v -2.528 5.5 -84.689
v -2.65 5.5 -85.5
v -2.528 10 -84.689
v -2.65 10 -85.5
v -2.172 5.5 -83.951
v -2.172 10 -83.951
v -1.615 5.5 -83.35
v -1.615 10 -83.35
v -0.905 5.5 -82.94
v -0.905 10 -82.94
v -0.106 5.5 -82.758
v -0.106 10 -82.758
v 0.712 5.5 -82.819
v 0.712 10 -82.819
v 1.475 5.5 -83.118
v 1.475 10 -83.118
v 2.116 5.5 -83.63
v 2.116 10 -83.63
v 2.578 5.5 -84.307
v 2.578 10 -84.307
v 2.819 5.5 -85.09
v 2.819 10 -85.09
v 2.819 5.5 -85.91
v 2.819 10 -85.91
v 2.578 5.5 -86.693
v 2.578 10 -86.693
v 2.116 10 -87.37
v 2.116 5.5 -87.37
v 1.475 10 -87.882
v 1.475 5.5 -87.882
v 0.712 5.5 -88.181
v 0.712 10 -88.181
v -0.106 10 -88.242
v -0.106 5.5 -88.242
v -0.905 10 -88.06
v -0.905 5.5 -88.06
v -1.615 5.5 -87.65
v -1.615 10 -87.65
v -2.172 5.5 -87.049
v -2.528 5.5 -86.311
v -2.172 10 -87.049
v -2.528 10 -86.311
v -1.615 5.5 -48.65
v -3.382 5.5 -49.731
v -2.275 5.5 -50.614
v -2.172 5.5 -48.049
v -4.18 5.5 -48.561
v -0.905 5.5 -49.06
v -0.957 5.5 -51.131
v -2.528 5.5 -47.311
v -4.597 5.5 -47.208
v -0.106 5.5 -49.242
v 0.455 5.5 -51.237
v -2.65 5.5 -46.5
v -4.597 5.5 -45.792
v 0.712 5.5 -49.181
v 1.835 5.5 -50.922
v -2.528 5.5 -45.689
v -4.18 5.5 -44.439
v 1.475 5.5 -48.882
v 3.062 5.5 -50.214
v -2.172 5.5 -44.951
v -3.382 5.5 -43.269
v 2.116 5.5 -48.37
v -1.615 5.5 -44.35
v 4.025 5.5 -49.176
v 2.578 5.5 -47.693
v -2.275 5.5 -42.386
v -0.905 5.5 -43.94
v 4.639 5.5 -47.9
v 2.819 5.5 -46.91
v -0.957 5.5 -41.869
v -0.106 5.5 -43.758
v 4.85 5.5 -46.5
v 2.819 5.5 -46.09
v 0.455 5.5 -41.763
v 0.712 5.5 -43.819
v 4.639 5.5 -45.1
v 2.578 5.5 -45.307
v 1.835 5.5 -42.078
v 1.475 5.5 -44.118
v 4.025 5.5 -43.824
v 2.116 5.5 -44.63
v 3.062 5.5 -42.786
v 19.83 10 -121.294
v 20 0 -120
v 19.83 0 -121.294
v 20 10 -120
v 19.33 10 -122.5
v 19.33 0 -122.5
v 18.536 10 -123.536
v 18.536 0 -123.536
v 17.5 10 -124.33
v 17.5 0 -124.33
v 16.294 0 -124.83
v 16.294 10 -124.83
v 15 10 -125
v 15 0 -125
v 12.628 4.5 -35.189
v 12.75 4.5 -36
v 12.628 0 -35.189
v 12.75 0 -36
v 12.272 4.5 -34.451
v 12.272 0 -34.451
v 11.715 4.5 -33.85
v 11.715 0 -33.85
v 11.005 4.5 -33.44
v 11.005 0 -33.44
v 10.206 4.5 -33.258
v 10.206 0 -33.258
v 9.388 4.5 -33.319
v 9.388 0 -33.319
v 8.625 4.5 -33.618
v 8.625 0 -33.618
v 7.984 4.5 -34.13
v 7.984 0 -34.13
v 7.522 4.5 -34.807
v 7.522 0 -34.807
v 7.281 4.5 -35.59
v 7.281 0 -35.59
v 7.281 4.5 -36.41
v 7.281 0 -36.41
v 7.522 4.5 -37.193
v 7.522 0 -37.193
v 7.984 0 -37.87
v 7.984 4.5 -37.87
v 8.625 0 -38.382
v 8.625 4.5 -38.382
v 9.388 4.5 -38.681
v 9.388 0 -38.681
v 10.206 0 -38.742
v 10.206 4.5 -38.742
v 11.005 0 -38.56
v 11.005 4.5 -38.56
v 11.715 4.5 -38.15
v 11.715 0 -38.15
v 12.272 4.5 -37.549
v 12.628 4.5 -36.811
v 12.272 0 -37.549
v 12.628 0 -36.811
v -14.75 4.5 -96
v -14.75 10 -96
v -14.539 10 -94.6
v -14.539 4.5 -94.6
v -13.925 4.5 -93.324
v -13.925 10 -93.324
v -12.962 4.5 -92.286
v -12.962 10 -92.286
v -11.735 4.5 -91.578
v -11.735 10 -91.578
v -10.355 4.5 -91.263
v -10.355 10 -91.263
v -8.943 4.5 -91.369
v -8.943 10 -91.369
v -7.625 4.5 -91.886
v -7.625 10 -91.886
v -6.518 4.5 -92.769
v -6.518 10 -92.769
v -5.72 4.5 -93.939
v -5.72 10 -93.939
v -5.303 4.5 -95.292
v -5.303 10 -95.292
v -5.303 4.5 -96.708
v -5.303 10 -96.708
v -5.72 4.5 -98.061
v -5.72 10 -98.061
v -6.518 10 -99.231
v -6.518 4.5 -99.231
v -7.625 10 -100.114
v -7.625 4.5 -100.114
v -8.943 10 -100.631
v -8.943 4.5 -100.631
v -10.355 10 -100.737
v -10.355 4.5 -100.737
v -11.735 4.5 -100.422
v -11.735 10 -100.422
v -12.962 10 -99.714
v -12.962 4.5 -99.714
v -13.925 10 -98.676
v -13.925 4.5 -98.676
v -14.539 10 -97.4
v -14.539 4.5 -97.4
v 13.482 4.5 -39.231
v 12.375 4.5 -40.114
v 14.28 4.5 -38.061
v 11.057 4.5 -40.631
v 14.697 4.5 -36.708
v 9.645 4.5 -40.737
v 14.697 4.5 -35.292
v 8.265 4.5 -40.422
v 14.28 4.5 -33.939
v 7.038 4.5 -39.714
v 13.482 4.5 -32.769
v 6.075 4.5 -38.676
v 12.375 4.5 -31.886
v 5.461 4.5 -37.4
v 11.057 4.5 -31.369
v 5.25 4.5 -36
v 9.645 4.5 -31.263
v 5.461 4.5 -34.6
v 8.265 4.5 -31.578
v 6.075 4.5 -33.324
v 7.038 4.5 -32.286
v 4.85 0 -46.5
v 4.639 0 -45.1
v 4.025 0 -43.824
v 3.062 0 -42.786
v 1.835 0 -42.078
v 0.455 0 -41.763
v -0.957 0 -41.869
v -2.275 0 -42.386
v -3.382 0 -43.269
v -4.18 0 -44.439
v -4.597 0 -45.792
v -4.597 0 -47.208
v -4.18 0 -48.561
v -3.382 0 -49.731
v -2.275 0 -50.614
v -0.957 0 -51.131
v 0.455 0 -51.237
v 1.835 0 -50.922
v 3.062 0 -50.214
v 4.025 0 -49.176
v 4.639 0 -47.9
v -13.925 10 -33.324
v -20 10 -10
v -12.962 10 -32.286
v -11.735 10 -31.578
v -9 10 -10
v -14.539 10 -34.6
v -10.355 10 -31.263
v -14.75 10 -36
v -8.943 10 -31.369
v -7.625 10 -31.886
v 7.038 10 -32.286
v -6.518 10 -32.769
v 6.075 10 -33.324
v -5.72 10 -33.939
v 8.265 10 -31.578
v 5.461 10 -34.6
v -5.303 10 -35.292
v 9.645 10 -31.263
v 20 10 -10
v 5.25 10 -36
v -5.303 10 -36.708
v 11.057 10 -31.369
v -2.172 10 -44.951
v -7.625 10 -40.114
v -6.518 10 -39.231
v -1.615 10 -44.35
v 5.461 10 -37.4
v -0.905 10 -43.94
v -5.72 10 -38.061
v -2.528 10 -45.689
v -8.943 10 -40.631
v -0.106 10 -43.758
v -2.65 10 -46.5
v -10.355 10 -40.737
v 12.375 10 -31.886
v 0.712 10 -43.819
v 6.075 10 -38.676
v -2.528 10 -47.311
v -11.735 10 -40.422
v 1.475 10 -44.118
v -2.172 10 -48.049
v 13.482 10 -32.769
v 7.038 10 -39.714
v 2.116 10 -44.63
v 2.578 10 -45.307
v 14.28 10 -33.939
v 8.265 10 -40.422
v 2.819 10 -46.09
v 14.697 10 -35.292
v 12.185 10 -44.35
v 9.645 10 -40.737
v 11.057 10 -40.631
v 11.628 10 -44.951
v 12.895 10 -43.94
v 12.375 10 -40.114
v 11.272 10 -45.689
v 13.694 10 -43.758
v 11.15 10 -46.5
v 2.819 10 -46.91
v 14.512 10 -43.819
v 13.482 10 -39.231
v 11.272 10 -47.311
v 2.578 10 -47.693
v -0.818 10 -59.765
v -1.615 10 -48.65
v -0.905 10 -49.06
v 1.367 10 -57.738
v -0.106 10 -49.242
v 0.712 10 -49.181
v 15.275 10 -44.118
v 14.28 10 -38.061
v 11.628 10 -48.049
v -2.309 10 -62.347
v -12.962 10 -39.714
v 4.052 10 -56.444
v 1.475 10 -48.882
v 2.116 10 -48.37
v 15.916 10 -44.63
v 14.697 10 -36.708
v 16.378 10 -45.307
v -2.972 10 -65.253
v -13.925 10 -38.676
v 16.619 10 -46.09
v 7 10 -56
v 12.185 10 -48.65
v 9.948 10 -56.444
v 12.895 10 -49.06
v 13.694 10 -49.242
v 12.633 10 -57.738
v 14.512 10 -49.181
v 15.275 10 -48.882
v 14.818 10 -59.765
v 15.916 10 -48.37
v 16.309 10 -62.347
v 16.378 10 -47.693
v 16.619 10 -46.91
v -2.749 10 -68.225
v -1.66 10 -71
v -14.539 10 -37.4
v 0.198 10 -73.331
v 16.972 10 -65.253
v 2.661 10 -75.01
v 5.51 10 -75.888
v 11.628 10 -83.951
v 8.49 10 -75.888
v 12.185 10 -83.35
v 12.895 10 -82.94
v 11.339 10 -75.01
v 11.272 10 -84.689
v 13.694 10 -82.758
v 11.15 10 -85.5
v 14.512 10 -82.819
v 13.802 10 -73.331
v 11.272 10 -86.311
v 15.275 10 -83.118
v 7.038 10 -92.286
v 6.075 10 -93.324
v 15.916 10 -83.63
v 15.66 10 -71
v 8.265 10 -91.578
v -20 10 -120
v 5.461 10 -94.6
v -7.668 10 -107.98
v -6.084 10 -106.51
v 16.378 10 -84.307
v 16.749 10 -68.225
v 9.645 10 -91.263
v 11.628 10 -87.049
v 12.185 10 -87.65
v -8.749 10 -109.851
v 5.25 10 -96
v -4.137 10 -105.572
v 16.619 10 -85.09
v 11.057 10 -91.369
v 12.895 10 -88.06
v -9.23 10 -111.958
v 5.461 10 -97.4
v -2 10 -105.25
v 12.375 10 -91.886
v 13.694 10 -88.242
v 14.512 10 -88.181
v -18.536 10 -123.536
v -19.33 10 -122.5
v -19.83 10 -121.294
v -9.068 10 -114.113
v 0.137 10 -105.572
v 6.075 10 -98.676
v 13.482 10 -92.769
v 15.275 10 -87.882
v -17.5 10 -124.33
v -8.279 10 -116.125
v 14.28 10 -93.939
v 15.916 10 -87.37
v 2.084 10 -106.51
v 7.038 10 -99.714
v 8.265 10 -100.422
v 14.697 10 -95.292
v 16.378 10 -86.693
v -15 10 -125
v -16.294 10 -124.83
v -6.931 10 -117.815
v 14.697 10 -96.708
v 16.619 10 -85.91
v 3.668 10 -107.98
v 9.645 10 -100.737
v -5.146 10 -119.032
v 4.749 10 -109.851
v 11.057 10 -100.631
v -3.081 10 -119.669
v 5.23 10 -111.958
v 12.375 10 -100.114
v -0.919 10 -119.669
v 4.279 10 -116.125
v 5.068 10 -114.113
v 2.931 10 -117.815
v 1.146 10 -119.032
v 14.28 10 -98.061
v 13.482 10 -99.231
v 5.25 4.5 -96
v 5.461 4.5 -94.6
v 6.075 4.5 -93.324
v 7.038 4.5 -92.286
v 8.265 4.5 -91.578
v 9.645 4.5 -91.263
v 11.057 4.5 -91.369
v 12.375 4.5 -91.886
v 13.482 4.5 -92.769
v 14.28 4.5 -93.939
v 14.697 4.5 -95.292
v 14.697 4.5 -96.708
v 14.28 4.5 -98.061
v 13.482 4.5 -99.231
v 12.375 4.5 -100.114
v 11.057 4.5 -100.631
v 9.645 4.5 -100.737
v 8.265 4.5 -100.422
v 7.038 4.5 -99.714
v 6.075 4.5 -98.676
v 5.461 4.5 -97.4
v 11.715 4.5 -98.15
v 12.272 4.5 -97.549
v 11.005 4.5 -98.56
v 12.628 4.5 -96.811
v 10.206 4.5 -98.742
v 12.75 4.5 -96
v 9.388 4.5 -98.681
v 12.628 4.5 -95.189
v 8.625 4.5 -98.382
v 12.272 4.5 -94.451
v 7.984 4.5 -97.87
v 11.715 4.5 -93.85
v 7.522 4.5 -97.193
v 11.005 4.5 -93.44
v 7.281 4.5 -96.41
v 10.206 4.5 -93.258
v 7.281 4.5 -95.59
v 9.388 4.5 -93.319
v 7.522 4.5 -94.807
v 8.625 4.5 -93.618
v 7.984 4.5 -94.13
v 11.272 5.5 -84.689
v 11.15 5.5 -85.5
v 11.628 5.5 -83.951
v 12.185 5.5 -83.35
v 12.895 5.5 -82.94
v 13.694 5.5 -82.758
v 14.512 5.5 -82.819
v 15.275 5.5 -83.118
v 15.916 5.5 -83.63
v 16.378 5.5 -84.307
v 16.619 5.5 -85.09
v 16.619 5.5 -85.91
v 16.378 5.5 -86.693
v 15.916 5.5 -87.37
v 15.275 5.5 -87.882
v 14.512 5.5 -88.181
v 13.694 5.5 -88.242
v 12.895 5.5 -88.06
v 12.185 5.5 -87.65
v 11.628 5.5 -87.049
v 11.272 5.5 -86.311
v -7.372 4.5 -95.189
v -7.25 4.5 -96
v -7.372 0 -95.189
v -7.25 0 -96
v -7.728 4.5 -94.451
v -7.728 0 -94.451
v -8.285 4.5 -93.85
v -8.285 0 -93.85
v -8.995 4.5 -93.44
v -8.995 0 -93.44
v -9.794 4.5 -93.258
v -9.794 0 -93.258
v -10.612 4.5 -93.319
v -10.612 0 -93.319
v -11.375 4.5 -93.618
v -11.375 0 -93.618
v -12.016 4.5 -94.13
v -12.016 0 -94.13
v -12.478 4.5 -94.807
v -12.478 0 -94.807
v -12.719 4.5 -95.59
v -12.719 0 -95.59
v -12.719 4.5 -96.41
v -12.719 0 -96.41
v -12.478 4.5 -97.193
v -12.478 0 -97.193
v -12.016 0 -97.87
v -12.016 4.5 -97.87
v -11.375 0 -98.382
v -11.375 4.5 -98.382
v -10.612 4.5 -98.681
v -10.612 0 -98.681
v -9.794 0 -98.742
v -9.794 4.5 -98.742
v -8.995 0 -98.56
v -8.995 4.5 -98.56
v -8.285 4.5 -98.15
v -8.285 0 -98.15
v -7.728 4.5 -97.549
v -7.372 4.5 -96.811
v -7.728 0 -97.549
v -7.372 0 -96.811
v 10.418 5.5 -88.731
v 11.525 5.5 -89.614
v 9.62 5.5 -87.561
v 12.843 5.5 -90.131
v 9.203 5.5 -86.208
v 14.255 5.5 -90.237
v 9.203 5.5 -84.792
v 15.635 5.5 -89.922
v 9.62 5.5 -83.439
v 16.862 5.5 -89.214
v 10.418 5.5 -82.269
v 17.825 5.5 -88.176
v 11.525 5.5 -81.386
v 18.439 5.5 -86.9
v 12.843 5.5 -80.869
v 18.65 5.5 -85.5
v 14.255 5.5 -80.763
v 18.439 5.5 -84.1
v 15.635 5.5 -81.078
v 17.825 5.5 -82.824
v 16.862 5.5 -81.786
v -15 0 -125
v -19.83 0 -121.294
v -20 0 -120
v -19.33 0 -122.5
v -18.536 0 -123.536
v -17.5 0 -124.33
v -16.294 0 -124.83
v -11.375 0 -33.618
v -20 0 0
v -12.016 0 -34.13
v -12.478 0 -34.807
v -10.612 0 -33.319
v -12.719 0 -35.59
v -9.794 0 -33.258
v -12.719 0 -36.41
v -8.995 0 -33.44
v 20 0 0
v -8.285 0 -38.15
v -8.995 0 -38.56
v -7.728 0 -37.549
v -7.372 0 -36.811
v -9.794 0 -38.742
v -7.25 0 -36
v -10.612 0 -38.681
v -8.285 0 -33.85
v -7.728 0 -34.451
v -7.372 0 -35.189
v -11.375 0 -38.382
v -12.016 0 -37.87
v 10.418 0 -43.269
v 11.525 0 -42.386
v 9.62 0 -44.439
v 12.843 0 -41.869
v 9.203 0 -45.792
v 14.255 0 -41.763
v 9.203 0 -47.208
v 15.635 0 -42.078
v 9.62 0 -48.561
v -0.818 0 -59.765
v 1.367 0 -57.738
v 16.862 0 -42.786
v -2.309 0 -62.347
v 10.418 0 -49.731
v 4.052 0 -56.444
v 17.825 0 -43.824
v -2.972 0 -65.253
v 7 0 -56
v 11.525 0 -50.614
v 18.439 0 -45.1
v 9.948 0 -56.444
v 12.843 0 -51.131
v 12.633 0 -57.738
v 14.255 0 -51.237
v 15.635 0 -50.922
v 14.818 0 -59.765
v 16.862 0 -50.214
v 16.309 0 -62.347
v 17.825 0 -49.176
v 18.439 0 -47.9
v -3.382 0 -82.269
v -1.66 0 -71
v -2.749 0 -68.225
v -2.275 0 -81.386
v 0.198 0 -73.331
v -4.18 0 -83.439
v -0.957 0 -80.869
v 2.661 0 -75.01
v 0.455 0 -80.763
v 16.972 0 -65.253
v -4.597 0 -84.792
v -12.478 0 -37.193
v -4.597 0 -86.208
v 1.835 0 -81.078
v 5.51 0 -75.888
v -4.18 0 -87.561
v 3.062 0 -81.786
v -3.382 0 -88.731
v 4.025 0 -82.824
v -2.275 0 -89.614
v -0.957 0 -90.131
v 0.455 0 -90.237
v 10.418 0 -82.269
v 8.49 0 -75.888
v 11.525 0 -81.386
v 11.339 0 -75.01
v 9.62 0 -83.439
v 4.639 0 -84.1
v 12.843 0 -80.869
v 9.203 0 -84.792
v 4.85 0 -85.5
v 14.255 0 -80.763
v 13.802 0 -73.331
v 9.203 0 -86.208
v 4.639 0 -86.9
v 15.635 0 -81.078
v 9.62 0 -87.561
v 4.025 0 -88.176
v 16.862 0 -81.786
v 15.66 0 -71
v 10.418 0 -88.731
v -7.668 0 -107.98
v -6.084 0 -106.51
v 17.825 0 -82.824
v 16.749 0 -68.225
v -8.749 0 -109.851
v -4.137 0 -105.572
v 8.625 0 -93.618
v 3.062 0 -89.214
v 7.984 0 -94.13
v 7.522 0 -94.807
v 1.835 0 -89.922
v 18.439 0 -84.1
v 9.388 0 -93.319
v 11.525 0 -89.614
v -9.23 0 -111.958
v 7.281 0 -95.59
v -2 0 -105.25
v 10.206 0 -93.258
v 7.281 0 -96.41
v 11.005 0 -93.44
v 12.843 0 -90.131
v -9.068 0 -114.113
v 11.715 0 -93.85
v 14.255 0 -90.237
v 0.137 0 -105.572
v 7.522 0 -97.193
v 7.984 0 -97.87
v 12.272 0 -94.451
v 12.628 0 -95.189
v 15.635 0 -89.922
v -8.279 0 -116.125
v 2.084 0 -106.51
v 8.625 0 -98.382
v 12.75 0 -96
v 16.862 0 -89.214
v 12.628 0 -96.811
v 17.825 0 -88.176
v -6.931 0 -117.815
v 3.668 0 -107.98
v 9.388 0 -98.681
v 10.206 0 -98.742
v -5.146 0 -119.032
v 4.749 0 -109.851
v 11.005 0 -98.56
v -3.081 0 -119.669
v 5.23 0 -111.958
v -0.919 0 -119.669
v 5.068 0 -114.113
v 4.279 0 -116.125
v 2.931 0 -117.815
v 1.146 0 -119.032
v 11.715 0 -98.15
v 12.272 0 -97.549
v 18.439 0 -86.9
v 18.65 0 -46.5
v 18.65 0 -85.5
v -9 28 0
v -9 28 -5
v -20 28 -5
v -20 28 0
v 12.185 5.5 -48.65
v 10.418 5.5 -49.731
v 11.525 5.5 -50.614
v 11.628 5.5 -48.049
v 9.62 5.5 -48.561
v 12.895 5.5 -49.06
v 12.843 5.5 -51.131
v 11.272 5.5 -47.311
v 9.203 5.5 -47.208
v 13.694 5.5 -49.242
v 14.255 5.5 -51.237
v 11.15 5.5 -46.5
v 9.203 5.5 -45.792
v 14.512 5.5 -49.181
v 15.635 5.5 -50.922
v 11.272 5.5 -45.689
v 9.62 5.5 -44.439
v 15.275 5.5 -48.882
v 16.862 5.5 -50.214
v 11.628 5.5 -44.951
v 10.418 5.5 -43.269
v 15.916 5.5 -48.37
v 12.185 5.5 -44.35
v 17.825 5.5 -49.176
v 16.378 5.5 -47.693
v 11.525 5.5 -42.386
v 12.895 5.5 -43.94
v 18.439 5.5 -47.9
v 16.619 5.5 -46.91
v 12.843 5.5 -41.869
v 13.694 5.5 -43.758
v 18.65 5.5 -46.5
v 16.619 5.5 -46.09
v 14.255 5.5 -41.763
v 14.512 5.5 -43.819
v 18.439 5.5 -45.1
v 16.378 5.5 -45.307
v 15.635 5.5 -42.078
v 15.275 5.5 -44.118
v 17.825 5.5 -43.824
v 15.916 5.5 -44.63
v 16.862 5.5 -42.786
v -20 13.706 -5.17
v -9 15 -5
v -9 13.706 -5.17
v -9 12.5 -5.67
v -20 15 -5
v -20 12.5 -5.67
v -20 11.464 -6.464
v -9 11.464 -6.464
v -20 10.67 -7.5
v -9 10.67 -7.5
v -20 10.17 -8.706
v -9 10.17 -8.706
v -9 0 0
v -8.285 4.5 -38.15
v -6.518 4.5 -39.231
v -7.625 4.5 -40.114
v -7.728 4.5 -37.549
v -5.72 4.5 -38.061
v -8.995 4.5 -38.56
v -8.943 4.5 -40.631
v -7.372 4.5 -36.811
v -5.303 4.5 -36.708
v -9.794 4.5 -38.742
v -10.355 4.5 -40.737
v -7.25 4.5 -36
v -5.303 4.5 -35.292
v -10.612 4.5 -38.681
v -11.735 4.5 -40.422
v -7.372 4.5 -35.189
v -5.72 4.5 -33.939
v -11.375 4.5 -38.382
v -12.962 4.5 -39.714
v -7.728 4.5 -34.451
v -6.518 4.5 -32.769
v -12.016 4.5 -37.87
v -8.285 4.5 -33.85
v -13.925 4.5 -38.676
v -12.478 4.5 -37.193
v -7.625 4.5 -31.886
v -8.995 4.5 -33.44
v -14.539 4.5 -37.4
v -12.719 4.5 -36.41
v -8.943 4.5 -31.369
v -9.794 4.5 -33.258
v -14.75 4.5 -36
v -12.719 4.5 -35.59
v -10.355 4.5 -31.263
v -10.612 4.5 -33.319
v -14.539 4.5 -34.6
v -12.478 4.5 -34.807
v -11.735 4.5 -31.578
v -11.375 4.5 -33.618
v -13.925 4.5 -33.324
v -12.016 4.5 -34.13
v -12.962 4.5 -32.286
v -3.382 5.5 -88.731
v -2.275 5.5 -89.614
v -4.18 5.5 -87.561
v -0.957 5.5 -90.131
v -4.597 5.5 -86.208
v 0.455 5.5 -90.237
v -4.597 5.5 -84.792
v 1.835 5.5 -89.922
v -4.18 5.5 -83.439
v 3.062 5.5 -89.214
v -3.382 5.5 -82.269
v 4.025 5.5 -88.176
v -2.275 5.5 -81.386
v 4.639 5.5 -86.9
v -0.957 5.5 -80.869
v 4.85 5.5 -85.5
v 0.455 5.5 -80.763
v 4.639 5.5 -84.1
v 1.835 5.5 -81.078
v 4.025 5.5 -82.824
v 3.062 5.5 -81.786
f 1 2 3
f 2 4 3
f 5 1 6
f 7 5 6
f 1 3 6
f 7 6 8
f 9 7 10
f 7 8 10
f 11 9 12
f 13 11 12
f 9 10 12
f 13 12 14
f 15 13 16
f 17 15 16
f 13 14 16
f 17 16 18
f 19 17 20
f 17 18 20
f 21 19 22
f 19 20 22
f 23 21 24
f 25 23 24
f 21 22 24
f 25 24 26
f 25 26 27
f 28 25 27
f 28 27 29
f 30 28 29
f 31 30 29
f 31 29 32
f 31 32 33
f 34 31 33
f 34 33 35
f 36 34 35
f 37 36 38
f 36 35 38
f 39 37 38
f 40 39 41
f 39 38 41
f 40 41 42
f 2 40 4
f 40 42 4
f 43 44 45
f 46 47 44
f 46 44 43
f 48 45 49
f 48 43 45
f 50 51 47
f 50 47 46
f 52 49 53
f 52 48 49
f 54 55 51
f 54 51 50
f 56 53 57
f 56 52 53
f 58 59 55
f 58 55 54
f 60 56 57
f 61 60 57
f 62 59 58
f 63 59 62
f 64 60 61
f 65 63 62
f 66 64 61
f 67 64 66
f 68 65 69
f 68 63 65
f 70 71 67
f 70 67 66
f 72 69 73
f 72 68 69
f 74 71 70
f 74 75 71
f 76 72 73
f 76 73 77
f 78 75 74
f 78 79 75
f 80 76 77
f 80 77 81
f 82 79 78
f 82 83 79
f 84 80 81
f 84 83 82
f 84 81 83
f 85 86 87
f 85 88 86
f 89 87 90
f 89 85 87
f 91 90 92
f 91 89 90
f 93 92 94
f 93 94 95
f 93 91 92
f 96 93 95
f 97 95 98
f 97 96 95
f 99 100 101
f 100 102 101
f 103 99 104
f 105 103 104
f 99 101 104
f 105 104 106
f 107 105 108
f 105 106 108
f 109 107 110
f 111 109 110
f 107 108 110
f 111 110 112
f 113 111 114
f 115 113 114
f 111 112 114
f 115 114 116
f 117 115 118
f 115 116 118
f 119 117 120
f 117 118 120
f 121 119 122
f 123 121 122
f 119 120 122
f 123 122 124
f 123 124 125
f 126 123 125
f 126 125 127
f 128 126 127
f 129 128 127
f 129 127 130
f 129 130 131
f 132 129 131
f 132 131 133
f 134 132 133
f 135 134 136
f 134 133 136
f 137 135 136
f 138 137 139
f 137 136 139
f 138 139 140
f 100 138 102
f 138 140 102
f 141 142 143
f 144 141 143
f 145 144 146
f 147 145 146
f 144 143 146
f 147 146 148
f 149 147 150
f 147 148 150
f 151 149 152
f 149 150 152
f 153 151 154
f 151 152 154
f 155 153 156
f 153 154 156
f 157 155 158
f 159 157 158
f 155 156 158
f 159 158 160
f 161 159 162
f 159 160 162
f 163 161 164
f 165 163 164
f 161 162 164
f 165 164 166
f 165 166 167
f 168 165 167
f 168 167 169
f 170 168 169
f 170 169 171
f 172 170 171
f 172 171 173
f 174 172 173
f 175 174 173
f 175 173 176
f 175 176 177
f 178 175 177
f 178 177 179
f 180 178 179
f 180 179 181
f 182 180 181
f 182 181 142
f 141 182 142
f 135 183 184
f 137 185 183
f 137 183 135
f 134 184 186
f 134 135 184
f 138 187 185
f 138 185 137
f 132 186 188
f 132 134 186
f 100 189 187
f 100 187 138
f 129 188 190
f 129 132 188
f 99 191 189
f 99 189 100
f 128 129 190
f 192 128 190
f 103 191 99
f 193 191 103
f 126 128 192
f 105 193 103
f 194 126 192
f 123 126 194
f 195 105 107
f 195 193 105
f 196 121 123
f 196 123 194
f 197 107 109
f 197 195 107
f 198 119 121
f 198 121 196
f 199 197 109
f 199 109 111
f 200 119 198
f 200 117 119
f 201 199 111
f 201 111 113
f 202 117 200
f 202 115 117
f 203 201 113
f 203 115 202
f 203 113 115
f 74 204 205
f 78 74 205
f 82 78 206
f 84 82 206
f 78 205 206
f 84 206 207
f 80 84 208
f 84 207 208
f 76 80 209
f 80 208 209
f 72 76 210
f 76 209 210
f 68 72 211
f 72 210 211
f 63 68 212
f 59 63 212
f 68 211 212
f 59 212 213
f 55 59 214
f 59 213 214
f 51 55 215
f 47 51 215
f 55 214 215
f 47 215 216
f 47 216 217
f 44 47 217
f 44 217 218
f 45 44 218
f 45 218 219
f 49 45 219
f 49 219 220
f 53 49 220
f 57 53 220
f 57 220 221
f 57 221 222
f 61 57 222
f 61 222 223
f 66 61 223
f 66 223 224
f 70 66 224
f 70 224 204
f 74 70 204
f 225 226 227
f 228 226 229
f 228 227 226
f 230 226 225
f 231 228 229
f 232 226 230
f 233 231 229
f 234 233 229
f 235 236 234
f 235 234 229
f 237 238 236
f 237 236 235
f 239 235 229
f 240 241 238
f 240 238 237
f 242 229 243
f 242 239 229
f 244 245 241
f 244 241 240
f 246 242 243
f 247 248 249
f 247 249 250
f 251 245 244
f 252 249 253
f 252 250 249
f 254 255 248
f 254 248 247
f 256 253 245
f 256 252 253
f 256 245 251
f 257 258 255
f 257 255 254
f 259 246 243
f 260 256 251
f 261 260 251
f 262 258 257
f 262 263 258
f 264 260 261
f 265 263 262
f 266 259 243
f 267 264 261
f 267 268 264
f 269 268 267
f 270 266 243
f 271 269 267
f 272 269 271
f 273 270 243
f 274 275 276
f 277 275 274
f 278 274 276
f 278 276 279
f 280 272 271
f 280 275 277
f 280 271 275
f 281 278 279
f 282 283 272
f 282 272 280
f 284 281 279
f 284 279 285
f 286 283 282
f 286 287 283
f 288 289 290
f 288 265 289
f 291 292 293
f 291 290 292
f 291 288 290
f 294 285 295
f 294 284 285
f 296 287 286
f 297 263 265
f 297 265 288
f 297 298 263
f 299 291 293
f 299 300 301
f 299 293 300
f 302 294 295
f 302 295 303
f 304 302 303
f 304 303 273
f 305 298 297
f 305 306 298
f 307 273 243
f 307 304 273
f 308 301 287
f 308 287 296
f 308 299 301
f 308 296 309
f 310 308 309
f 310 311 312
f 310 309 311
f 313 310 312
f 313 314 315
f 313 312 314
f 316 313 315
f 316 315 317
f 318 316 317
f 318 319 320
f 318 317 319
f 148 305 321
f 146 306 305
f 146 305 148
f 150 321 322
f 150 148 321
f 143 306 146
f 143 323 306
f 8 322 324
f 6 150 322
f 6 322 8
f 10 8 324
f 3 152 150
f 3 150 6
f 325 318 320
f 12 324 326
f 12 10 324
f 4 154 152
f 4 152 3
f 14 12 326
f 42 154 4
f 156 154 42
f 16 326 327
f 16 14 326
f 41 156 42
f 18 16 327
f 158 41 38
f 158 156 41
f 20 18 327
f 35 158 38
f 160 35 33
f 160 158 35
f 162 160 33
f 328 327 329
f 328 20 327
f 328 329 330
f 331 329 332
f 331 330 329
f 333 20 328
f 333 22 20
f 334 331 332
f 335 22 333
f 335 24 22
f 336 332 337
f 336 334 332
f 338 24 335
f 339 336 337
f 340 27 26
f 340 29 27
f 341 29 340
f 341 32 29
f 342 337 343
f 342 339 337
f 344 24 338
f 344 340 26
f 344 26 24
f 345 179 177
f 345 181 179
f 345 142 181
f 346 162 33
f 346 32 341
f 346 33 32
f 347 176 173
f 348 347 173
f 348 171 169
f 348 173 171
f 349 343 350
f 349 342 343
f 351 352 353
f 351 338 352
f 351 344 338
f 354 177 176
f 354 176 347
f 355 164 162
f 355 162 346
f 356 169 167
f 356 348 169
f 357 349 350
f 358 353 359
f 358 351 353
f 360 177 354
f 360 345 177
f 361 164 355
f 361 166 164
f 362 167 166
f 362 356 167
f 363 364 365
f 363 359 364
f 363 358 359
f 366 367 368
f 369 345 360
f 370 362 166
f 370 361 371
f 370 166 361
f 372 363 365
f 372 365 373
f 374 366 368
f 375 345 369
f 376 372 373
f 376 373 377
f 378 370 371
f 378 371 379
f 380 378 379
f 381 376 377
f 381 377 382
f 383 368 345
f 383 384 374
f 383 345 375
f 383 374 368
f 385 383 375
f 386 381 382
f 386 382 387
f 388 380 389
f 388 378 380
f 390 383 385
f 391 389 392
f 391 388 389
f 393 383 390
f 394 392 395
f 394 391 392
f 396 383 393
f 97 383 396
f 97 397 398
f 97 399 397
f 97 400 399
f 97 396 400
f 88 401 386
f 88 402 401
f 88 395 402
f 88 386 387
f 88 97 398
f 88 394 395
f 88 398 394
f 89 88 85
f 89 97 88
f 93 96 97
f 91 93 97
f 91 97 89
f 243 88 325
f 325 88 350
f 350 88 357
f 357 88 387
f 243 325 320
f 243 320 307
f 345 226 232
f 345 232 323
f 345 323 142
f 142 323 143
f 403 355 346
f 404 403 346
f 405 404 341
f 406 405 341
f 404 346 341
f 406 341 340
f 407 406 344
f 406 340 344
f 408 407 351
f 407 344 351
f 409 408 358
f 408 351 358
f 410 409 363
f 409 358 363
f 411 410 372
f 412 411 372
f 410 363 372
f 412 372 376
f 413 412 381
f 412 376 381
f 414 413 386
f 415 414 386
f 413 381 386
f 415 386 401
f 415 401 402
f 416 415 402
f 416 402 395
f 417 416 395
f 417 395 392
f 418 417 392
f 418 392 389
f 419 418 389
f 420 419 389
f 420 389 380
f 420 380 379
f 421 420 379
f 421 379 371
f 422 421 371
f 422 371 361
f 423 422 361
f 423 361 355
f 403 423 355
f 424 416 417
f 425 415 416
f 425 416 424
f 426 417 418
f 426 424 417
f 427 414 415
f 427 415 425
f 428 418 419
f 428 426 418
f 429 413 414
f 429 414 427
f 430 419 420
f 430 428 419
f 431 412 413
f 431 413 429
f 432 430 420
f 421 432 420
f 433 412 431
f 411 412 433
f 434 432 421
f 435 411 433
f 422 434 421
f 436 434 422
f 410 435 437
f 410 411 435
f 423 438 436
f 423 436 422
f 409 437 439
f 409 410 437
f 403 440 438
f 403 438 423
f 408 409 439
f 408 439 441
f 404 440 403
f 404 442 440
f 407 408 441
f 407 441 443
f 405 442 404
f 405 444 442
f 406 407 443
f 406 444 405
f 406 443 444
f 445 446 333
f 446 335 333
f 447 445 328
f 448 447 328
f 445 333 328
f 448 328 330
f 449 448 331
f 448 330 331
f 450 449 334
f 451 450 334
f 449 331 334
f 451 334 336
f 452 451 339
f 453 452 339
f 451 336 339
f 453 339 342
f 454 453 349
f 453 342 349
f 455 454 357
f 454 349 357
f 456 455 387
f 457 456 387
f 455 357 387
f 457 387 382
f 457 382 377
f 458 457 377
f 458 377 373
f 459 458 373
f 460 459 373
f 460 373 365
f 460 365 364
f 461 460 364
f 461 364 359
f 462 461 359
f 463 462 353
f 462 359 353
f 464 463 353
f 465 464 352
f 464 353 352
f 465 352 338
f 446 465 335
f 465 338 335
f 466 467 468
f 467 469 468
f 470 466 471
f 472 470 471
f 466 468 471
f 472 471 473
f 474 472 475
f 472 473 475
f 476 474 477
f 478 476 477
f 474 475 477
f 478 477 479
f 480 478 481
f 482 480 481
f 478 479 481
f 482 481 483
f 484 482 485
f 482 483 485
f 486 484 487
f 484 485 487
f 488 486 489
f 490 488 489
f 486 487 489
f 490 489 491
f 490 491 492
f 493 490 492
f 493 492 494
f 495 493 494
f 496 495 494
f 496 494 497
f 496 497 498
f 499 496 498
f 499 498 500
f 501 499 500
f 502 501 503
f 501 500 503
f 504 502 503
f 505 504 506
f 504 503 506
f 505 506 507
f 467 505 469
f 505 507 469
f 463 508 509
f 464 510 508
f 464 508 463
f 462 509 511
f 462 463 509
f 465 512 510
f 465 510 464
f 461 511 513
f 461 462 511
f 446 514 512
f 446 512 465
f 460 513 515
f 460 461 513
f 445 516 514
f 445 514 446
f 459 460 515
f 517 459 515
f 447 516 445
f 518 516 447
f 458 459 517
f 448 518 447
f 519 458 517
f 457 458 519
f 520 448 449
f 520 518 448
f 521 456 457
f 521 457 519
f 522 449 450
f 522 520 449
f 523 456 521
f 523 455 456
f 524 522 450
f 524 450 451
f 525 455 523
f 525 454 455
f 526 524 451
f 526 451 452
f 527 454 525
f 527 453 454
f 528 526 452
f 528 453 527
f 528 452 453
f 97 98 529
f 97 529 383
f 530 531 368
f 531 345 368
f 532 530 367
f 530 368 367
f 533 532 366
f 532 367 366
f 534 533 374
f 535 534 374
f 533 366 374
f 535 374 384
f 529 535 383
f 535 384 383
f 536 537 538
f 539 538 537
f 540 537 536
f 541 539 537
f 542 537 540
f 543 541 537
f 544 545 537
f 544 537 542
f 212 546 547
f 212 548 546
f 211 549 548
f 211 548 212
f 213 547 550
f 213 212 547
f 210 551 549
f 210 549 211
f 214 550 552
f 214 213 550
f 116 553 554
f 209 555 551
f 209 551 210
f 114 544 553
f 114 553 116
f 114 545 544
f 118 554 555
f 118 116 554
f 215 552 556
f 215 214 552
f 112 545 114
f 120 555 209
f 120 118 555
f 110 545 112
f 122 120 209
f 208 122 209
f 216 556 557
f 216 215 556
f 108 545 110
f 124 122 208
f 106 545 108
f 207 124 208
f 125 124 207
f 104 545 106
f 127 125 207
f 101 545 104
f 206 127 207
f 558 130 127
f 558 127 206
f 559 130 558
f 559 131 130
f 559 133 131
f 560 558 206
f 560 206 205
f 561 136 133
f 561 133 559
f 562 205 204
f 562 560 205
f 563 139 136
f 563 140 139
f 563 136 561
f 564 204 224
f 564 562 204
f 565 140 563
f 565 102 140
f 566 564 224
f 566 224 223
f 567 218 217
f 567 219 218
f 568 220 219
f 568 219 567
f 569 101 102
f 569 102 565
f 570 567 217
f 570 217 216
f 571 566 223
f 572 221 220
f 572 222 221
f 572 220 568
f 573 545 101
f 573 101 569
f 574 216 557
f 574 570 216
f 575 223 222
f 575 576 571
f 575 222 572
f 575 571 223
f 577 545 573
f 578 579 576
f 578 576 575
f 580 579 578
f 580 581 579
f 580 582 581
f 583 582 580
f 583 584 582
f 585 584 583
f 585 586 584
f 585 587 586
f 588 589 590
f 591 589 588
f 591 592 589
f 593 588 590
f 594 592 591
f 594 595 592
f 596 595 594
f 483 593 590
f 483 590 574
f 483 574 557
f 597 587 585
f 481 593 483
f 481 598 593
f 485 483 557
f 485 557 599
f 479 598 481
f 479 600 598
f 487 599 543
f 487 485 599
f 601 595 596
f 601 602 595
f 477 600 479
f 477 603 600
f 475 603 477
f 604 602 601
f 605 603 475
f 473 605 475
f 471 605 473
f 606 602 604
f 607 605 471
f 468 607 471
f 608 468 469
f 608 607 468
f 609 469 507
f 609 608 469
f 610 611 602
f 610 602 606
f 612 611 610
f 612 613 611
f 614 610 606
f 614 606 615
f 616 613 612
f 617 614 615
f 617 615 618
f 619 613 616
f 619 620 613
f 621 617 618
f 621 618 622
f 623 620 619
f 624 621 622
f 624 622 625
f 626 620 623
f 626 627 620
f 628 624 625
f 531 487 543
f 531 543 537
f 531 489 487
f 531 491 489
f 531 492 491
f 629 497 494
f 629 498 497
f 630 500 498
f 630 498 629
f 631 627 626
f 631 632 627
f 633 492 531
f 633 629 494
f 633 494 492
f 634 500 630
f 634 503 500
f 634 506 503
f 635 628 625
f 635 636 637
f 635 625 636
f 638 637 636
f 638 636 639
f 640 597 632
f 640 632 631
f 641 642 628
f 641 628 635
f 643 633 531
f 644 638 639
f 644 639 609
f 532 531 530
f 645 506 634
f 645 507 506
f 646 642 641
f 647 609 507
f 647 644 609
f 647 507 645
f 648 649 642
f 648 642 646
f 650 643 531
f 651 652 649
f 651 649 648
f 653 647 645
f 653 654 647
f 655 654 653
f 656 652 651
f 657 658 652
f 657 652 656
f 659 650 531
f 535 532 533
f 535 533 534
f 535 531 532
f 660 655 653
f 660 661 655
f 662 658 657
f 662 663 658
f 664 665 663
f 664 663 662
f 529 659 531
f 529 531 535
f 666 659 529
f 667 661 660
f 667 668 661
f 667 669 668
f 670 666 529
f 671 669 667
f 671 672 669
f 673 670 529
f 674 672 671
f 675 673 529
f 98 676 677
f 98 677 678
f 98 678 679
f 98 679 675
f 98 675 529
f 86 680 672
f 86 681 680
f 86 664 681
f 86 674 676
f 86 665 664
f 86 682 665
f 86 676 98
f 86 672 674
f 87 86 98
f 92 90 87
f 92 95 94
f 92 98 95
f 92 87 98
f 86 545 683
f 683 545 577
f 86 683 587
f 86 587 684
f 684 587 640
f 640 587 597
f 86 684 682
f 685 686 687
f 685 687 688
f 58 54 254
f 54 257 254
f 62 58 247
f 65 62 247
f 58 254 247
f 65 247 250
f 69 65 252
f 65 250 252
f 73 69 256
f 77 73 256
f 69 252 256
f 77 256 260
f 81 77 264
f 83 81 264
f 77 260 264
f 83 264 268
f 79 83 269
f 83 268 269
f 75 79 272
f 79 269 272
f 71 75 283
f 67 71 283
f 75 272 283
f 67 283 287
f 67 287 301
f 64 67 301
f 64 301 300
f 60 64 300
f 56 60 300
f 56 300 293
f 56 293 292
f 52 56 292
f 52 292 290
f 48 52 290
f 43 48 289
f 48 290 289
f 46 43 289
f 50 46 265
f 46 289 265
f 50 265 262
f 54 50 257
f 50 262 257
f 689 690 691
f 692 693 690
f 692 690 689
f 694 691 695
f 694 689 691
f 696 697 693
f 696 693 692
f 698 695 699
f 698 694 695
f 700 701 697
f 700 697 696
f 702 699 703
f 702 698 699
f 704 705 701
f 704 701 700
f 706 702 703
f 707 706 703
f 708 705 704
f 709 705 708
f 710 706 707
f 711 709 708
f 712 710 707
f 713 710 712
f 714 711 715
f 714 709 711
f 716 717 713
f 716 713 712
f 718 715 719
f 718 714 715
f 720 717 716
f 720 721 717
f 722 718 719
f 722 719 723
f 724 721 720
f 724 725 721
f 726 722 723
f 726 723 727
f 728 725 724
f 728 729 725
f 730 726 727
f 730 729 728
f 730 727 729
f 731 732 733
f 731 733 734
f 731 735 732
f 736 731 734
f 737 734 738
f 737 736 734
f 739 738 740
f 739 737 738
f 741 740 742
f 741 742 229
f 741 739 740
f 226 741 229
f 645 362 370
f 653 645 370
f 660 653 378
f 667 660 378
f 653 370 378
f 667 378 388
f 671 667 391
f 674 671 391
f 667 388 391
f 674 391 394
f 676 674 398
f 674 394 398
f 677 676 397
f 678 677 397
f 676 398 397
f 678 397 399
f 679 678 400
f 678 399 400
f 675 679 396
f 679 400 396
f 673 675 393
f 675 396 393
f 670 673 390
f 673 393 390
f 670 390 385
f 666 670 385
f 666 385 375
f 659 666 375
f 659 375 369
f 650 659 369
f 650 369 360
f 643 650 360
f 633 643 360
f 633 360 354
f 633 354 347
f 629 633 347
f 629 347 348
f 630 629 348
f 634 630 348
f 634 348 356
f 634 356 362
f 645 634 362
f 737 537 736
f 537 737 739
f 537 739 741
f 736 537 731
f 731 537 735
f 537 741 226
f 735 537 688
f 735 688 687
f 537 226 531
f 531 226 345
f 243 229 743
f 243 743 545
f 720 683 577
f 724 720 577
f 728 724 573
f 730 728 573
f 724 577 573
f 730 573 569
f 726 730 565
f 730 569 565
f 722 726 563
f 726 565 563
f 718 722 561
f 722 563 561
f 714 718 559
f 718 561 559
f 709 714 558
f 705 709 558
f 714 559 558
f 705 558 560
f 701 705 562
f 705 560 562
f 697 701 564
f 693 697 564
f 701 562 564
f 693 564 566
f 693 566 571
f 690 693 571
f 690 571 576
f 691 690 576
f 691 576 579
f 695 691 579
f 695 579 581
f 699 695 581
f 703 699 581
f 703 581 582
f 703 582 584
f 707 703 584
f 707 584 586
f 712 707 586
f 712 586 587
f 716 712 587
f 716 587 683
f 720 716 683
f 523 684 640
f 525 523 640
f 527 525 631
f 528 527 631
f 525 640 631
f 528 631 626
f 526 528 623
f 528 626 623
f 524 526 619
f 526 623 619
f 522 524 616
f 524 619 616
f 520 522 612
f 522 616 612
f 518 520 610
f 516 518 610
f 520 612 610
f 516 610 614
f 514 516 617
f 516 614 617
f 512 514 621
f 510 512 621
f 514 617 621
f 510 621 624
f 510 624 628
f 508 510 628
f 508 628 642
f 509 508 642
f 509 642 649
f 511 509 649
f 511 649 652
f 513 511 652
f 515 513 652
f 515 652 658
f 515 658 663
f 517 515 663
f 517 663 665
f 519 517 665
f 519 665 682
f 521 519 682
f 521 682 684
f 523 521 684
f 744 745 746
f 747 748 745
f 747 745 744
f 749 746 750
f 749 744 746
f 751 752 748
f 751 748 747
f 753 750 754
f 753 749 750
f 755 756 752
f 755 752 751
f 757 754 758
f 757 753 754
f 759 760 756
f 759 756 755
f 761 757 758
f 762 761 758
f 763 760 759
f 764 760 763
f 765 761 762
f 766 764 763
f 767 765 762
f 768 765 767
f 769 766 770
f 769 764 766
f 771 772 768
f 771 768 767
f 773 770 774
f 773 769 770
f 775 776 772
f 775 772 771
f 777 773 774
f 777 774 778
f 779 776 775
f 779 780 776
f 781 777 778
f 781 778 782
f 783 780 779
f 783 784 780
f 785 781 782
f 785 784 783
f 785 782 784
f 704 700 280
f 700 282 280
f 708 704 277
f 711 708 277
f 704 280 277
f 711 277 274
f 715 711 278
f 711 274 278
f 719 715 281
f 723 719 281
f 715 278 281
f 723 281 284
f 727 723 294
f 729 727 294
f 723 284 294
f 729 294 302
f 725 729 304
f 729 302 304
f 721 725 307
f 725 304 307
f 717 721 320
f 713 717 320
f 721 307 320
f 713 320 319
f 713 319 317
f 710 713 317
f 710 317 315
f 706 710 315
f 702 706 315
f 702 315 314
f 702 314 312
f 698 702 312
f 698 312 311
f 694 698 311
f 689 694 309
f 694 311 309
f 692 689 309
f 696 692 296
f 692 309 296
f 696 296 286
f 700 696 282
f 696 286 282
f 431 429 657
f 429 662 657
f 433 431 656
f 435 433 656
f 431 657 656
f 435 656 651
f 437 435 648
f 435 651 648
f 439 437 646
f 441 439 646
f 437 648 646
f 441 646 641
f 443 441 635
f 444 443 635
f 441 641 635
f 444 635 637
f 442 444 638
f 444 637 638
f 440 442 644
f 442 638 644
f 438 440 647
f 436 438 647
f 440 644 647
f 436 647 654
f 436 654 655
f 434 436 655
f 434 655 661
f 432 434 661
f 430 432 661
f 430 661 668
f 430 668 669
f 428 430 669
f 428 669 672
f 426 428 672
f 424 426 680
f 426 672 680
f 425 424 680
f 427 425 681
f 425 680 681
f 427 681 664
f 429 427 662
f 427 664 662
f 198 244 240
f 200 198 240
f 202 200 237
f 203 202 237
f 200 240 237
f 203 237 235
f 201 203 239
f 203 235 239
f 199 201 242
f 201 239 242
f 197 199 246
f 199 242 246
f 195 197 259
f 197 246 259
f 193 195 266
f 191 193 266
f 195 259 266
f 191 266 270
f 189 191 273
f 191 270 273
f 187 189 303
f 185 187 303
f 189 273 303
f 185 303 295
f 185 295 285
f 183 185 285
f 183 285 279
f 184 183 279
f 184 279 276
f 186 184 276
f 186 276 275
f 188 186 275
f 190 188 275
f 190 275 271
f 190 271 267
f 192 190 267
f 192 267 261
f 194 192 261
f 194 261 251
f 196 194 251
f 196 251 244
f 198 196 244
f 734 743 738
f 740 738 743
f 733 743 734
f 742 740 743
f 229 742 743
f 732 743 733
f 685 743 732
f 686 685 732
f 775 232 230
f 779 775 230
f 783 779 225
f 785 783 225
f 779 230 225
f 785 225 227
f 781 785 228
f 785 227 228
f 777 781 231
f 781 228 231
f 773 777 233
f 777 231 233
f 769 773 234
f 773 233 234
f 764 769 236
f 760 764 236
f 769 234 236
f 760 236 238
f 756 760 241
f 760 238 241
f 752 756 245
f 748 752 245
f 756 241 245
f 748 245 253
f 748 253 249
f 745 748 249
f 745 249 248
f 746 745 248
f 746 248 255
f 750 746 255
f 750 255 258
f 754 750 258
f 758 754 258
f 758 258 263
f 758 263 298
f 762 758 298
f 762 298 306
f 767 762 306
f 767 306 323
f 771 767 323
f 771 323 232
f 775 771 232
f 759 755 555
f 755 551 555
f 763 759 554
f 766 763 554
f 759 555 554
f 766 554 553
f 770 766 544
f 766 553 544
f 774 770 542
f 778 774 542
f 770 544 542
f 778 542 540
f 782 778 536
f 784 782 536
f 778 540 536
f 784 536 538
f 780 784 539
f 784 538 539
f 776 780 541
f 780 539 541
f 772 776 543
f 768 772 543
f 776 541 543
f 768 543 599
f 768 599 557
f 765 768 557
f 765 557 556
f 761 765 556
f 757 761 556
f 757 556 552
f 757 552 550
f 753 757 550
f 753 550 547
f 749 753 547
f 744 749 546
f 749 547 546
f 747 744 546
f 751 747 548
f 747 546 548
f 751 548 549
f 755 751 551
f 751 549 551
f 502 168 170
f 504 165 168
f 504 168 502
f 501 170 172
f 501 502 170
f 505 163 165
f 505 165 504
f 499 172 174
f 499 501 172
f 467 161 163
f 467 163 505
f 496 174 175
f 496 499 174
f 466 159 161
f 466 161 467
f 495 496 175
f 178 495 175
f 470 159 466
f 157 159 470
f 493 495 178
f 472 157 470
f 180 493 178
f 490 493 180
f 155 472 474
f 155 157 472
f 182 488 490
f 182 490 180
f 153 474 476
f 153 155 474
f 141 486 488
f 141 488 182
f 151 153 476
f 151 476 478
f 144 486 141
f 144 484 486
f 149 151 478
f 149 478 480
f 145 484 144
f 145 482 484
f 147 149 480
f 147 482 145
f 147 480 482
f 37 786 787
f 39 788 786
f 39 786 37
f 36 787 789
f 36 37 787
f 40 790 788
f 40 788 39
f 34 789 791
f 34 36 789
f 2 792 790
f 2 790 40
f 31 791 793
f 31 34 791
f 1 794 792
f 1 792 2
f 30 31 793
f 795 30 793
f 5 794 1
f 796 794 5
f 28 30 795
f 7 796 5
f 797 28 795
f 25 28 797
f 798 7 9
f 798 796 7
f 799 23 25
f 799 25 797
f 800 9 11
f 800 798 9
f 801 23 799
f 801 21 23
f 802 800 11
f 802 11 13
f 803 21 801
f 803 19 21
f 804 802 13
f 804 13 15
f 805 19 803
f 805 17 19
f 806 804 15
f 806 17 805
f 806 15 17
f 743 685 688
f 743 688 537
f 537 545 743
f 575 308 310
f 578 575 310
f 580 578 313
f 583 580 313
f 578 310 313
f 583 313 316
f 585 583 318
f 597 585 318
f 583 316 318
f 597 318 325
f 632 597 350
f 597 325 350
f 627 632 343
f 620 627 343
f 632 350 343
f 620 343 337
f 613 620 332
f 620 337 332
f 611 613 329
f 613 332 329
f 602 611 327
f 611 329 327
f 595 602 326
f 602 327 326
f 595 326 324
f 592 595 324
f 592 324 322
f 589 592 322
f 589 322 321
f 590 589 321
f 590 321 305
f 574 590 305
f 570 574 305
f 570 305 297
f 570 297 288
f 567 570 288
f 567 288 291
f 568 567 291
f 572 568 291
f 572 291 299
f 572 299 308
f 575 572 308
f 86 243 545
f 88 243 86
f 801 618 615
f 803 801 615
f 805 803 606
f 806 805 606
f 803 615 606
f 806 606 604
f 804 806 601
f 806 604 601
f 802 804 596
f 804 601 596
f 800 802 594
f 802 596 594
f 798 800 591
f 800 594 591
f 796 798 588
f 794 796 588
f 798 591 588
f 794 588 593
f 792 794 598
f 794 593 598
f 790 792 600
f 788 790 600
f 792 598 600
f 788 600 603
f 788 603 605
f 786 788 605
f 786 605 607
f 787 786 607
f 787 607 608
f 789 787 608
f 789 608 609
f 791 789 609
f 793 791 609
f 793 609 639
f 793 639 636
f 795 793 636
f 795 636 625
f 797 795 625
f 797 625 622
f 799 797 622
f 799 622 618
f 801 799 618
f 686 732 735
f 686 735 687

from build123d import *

# Parameters (mm, degrees)
EXTRUDE_1_DEPTH           = 20
SKETCH_2_W                = 29
SKETCH_2_H                = 5
CUT_EXTRUDE_1_DEPTH       = 18
FILLET_1_R                = 5
CHAMFER_1_SIZE            = 10
SKETCH_3_R                = 10
CUT_EXTRUDE_2_DEPTH       = 128.863208156
HOLE_WIZARD_1_D           = 5.5
HOLE_WIZARD_1_CBORE_D     = 9.5
HOLE_WIZARD_1_CBORE_DEPTH = 5.5
HOLE_WIZARD_2_D           = 5.5
HOLE_WIZARD_2_DEPTH       = 31
HOLE_WIZARD_2_CBORE_D     = 9.5
HOLE_WIZARD_2_CBORE_DEPTH = 5.5
SKETCH_9_R                = 7.25
CUT_EXTRUDE_3_DEPTH       = 128.863208156
FILLET_2_R                = 5


with BuildPart() as part:
    # 草图1 → 凸台-拉伸1 (new, symmetric)
    with BuildSketch(Plane(origin=(0, 0, 0), x_dir=(0, 0, -1), z_dir=(1, 0, 0))):
        Polygon((0, 28), (0, 0), (125, 0), (125, 10), (5, 10), (5, 28), align=None)
    extrude(amount=EXTRUDE_1_DEPTH, both=True)

    # 草图2 → 切除-拉伸1 (cut)
    with BuildSketch(Plane(origin=(0, 28, 0), x_dir=(1, 0, 0), z_dir=(0, 1, 0))):
        with Locations((5.5, 2.5)):
            Rectangle(SKETCH_2_W, SKETCH_2_H)
    extrude(amount=-CUT_EXTRUDE_1_DEPTH, mode=Mode.SUBTRACT)

    # 圆角1
    fillet_1_edges = [part.edges().sort_by_distance(p)[0] for p in [
        (-14.5, 10, -5),
    ]]
    fillet(fillet_1_edges, radius=FILLET_1_R)

    # 倒角1
    chamfer_1_edges = [part.edges().sort_by_distance(p)[0] for p in [
        (5.5, 10, 0),
    ]]
    chamfer(chamfer_1_edges, length=CHAMFER_1_SIZE - 0.0001)  # a hair under: the kernel refuses the full size

    # 草图3 → 切除-拉伸2 (cut, through all)
    with BuildSketch(Plane(origin=(0, 10, 0), x_dir=(1, 0, 0), z_dir=(0, 1, 0))):
        with Locations(Location((7, 66, 0), (0, 0, 270))):
            Circle(SKETCH_3_R)
    extrude(amount=-CUT_EXTRUDE_2_DEPTH, mode=Mode.SUBTRACT)

    # 孔1 (through all)
    with Locations(Plane.XZ):
        with Locations((13.9, -46.5), (0.1, -46.5), (0.1, -85.5), (13.9, -85.5)):
            CounterBoreHole(HOLE_WIZARD_1_D / 2, HOLE_WIZARD_1_CBORE_D / 2, HOLE_WIZARD_1_CBORE_DEPTH)

    # 孔2
    with Locations(Plane(origin=(0, 10, 0), x_dir=(-1, 0, 0), z_dir=(0, 1, 0))):
        with Locations((-10, -96), (10, -96), (10, -36), (-10, -36)):
            CounterBoreHole(HOLE_WIZARD_2_D / 2, HOLE_WIZARD_2_CBORE_D / 2, HOLE_WIZARD_2_CBORE_DEPTH, depth=HOLE_WIZARD_2_DEPTH)

    # 草图9 → 切除-拉伸3 (cut, through all)
    with BuildSketch(Plane(origin=(0, 10, 0), x_dir=(1, 0, 0), z_dir=(0, 1, 0))):
        with Locations(Location((-2, 112.5, 0), (0, 0, 270))):
            Circle(SKETCH_9_R)
    extrude(amount=-CUT_EXTRUDE_3_DEPTH, mode=Mode.SUBTRACT)

    # 圆角2
    fillet_2_edges = [part.edges().sort_by_distance(p)[0] for p in [
        (20, 5, -125),
        (-20, 5, -125),
    ]]
    fillet(fillet_2_edges, radius=FILLET_2_R)


solid = part.part
